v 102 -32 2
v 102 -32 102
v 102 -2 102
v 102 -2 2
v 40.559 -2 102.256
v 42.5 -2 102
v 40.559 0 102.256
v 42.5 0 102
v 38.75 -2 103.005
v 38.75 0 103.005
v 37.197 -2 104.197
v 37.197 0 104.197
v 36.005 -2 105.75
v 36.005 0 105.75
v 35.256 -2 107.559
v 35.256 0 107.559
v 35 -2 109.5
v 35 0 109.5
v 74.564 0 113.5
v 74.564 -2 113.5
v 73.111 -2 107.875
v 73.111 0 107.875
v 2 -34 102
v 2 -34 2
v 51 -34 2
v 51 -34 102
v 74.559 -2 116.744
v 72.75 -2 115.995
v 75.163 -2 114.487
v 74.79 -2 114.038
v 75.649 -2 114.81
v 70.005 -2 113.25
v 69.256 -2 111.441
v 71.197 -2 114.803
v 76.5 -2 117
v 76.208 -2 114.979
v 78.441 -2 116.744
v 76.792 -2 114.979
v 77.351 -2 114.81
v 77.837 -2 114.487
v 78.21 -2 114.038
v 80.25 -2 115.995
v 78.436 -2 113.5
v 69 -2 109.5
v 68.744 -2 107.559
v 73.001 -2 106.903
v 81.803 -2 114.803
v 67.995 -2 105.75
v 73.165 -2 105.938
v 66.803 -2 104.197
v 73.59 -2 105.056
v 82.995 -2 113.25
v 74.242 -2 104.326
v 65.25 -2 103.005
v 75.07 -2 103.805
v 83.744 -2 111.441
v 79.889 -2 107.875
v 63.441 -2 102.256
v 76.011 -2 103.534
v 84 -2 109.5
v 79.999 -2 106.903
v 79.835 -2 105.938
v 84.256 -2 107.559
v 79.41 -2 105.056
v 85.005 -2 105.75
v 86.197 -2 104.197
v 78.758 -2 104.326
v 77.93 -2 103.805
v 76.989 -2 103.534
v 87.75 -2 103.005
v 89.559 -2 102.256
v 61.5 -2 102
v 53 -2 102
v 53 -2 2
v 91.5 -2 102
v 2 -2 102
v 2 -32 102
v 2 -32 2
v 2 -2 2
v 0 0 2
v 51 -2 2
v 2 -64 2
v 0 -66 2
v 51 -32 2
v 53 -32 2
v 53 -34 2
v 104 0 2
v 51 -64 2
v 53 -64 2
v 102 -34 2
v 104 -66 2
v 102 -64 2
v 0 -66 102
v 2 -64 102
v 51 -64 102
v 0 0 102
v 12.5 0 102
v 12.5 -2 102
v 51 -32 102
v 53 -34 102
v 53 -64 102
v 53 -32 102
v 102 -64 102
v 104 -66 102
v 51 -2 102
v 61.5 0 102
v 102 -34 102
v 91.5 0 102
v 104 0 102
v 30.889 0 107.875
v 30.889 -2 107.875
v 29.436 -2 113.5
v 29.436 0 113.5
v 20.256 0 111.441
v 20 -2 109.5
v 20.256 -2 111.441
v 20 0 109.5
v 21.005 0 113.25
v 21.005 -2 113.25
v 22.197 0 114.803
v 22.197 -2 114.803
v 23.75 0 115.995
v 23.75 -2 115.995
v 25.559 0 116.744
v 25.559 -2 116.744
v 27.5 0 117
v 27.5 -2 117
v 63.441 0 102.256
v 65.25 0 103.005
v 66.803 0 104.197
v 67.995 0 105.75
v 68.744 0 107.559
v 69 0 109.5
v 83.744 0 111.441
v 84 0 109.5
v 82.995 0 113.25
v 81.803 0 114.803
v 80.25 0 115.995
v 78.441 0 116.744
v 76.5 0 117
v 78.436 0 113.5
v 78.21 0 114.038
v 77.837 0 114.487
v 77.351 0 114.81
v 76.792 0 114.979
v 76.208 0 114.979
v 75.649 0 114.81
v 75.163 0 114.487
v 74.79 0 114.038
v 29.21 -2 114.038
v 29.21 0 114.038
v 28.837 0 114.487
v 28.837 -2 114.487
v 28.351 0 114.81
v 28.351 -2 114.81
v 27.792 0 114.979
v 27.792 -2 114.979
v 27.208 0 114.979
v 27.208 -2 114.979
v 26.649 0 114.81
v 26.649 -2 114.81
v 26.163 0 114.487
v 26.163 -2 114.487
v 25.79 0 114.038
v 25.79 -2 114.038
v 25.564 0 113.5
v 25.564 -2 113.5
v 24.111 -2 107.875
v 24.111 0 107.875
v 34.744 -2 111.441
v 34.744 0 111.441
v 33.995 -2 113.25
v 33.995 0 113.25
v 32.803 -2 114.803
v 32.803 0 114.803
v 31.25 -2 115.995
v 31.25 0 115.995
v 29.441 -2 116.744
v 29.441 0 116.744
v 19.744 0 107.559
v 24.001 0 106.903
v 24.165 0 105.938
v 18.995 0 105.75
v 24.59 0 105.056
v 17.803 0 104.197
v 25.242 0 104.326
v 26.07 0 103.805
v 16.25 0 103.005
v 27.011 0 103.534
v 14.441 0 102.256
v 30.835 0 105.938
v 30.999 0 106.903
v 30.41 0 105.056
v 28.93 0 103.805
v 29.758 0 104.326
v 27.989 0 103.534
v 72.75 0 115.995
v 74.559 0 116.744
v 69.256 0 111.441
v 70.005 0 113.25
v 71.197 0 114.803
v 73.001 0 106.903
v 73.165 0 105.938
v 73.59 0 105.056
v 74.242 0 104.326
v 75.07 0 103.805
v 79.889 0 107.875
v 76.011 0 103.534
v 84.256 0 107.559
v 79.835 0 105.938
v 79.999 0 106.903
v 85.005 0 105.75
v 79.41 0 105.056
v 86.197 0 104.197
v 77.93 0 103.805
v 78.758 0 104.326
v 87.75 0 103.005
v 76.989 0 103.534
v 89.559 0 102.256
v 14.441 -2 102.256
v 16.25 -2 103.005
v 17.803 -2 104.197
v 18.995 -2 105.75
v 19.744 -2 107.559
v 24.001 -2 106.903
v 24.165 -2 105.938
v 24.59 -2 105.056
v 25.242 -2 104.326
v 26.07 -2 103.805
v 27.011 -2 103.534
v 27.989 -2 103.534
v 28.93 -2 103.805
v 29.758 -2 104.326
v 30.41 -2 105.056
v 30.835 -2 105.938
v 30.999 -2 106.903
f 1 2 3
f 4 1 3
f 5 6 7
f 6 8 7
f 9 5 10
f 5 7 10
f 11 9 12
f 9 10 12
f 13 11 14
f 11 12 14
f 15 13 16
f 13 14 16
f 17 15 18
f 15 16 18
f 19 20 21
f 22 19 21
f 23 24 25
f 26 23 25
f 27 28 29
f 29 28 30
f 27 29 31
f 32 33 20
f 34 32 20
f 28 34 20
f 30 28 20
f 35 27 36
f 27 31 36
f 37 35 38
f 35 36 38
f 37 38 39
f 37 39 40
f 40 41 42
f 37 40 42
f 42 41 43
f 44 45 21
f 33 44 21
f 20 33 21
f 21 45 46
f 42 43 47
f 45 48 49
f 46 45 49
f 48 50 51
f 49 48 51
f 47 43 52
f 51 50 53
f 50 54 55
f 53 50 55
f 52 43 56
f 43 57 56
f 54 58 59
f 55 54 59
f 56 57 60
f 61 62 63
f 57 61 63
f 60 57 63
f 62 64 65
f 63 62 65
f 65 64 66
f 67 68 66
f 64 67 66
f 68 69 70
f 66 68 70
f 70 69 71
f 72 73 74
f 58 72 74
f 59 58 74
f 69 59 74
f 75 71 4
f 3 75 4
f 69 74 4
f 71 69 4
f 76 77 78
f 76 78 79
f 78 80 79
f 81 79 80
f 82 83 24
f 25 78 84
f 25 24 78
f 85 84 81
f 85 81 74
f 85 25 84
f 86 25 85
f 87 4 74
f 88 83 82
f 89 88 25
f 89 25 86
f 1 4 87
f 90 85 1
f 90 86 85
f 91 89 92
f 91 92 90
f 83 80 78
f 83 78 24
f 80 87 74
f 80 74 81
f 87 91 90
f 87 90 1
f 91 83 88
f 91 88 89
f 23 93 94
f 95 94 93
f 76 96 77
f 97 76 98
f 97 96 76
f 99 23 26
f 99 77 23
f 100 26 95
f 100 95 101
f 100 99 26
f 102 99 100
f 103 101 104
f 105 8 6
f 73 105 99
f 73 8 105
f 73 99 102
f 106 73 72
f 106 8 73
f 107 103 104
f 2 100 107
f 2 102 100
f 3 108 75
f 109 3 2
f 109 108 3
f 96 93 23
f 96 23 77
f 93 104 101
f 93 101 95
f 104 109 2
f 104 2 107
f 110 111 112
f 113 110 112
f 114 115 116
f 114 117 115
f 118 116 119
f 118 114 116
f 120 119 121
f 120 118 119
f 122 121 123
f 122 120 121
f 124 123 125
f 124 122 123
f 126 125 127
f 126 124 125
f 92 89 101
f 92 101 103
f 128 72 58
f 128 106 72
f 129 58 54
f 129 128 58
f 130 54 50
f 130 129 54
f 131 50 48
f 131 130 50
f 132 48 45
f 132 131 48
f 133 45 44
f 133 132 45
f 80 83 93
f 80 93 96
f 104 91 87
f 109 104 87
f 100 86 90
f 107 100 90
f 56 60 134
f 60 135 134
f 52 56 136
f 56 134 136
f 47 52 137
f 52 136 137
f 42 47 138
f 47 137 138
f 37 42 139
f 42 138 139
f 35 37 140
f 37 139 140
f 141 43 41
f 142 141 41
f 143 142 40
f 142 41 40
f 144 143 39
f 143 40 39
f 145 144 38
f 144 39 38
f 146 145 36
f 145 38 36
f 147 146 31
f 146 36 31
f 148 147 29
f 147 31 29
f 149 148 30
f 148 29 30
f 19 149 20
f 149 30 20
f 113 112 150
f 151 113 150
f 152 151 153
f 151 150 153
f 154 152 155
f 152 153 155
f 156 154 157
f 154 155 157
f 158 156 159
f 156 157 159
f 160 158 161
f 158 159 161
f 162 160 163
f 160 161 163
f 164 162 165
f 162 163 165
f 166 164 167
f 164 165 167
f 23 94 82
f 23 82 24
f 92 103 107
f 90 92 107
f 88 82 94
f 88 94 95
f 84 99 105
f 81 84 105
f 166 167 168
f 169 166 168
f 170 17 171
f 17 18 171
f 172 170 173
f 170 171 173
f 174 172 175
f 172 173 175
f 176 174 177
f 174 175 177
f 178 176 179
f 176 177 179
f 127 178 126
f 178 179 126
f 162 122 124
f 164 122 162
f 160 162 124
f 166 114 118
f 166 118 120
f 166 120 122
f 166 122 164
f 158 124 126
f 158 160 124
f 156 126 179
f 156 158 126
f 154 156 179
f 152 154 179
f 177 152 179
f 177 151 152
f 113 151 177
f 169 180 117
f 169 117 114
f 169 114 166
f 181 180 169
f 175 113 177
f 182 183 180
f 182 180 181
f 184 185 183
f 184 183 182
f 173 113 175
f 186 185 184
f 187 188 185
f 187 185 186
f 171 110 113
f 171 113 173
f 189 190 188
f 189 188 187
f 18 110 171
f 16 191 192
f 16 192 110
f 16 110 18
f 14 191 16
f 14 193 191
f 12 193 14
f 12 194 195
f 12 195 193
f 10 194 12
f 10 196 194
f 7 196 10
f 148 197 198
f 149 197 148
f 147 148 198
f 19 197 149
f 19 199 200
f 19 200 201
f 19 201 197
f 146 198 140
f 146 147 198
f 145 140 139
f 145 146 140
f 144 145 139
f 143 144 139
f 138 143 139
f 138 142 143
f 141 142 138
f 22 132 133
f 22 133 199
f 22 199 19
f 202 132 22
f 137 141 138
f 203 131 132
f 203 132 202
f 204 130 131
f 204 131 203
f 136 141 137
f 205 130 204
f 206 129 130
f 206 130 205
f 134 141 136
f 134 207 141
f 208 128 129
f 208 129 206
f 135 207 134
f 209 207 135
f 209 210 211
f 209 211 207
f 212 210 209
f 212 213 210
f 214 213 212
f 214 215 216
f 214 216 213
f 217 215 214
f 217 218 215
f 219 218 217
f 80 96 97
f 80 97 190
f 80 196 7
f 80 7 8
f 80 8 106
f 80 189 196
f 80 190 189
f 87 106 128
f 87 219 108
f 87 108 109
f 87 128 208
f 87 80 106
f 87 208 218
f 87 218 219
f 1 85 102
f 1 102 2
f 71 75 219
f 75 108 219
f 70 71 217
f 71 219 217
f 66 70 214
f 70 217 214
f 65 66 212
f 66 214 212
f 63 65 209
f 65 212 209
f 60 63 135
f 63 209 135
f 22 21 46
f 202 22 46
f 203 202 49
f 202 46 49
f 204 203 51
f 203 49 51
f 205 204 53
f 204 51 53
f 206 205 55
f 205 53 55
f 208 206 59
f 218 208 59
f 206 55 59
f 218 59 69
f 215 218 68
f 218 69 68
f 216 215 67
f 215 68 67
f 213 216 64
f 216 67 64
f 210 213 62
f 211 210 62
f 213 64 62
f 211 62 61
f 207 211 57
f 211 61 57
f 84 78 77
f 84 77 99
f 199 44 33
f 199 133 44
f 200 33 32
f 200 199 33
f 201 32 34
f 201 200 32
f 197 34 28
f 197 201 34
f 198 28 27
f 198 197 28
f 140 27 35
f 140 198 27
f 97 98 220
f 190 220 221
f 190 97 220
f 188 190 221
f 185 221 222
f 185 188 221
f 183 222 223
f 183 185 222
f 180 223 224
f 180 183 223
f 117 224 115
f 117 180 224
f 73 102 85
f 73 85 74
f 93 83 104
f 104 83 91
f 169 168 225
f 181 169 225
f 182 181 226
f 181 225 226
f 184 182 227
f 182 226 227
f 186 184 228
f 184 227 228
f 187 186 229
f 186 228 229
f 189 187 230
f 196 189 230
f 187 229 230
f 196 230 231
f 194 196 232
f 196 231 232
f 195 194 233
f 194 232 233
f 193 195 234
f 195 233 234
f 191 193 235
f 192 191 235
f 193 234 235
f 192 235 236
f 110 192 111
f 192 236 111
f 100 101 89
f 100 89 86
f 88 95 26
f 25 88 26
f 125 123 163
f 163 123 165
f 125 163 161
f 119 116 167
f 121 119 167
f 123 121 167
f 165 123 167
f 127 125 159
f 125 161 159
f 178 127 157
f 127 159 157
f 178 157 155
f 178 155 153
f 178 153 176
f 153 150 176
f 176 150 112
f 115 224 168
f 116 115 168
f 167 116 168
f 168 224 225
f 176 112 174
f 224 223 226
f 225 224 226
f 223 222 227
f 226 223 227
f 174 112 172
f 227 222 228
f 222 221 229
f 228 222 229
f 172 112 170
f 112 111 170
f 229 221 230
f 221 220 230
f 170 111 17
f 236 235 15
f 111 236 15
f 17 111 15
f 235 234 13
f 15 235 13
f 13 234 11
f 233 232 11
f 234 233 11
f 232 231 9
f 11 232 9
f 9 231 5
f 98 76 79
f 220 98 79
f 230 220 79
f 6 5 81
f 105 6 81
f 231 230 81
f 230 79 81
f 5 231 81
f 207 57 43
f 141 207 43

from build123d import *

# Parameters (mm, degrees)
F1_DEPTH  = 2
F2_W      = 104
F2_H      = 66
F2_W_2    = 49
F2_H_2    = 30
F3_DEPTH  = 100
F4_W      = 15
F4_H      = 2
F5_DEPTH  = 15
F7_DEPTH  = 2
F8_R      = 7.49999
F9_W      = 104
F9_H      = 66
F10_DEPTH = 2


# Not quite as in the source:
# - a fillet or chamfer is up to 0.001 mm smaller than in the source, because OpenCascade refuses the exact size


with BuildPart() as f1:
    # F0 (on Top) → F1 (new body)
    with BuildSketch(Plane.XY):
        Polygon((104, 0), (0, 0), (0, -34), (0, -66), (104, -66), (104, -34), align=None)
    extrude(amount=F1_DEPTH)

    # F2 (on face) → F3 (join)
    with BuildSketch(Plane.XY.offset(2)):
        with Locations((52, -33)):
            Rectangle(F2_W, F2_H)
        with Locations((26.5, -49)):
            Rectangle(F2_W_2, F2_H_2, mode=Mode.SUBTRACT)
        with Locations((77.5, -49)):
            Rectangle(F2_W_2, F2_H_2, mode=Mode.SUBTRACT)
        with Locations((26.5, -17)):
            Rectangle(F2_W_2, F2_H_2, mode=Mode.SUBTRACT)
        with Locations((77.5, -17)):
            Rectangle(F2_W_2, F2_H_2, mode=Mode.SUBTRACT)
    extrude(amount=F3_DEPTH)

    # F4 (on face) → F5 (join)
    with BuildSketch(Plane.XY.offset(102)):
        with Locations((27.5, -1)):
            Rectangle(F4_W, F4_H)
        with Locations((76.5, -1)):
            Rectangle(F4_W, F4_H)
    extrude(amount=F5_DEPTH)

    # F6 (on face) → F7 (cut, through all)
    with BuildSketch(Plane.XZ.offset(2)):
        with BuildLine():
            Line((79.8888604279, 107.875), (78.4364916731, 113.5))
            ThreePointArc((78.4364916731, 113.5), (76.5, 115), (74.5635083269, 113.5))
            Line((74.5635083269, 113.5), (73.1111395721, 107.875))
            ThreePointArc((73.1111395721, 107.875), (76.5, 103.5), (79.8888604279, 107.875))
        make_face()
        with BuildLine():
            Line((30.8888604279, 107.875), (29.4364916731, 113.5))
            ThreePointArc((29.4364916731, 113.5), (27.5, 115), (25.5635083269, 113.5))
            Line((25.5635083269, 113.5), (24.1111395721, 107.875))
            ThreePointArc((24.1111395721, 107.875), (27.5, 103.5), (30.8888604279, 107.875))
        make_face()
    extrude(amount=-F7_DEPTH, mode=Mode.SUBTRACT)

    # F8 (radius 7.5 in the source; OpenCascade refuses exactly that, so slightly less here)
    f8_edges = [f1.edges().sort_by_distance(p)[0] for p in [
        (84, -1, 102),
        (84, -1, 117),
        (69, -1, 117),
        (69, -1, 102),
        (35, -1, 102),
        (35, -1, 117),
        (20, -1, 117),
        (20, -1, 102),
    ]]
    fillet(f8_edges, radius=F8_R)

    # F9 (on face) → F10 (cut)
    with BuildSketch(Plane(origin=(0, 0, 0), x_dir=(1, 0, 0), z_dir=(0, 0, -1))):
        with Locations((52, 33)):
            Rectangle(F9_W, F9_H)
    extrude(amount=-F10_DEPTH, mode=Mode.SUBTRACT)


solid = f1.part
